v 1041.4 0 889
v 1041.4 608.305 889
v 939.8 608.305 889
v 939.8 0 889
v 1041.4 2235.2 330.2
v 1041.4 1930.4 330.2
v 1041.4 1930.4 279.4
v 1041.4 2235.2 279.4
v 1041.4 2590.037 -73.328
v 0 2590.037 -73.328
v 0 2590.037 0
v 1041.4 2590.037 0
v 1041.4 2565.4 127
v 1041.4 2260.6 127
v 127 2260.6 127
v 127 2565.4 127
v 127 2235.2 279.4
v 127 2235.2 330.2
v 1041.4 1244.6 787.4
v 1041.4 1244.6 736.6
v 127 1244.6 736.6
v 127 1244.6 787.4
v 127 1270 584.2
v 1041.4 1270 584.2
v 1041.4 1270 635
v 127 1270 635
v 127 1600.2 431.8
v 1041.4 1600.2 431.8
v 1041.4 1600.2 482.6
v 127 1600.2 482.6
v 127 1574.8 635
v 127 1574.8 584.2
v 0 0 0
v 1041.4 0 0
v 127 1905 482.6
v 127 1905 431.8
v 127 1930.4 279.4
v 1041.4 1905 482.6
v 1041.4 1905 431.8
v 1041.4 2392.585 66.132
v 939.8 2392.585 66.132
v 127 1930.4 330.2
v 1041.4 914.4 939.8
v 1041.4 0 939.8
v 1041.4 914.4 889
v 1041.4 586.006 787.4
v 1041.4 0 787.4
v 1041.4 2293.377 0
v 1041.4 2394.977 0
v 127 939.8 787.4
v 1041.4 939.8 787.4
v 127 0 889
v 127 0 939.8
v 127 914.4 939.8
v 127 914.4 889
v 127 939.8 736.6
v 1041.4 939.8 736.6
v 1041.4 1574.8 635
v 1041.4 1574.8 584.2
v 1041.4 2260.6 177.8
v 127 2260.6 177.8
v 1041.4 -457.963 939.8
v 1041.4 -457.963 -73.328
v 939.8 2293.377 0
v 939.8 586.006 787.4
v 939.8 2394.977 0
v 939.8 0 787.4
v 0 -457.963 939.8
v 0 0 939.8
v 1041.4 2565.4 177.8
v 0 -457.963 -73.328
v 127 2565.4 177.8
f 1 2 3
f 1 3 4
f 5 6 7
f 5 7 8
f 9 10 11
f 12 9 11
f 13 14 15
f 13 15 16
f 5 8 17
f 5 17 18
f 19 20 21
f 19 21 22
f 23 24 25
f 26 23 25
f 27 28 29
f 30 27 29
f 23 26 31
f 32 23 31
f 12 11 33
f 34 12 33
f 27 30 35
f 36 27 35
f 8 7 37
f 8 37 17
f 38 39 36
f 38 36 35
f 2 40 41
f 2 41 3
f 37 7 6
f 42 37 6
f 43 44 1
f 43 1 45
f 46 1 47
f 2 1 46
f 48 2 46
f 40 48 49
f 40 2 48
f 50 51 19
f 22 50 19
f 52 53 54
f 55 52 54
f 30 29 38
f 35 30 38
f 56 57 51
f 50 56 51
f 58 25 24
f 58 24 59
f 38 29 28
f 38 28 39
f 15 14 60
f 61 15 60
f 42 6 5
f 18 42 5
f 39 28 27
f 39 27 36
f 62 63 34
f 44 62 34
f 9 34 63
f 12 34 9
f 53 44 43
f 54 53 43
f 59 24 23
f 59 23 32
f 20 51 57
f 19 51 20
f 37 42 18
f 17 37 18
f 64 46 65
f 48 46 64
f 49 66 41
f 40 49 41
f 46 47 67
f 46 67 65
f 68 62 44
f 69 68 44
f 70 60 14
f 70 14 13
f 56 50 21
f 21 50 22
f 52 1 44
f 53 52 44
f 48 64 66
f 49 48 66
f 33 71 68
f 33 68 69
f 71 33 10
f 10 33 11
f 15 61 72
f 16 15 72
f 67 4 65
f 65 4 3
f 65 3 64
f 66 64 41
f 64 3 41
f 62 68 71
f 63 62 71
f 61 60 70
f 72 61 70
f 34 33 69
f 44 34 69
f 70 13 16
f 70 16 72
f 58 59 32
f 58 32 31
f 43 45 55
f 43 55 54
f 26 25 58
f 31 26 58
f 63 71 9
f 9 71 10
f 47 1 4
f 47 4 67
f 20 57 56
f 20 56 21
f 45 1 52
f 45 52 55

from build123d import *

# Parameters (mm, degrees)
F0_W     = 457.962586
F0_H     = 939.8
F1_DEPTH = 1041.4
F2_W     = 914.4
F2_H     = 50.8
F2_W_2   = 304.8
F3_DEPTH = 914.4
F5_DEPTH = 101.6


with BuildPart() as f1:
    # F0 (on Right) → F1 (new body)
    with BuildSketch(Plane.YZ):
        with Locations((-228.981293, 469.9)):
            Rectangle(F0_W, F0_H)
        Polygon((2590.037414, 0), (0, 0), (-457.962586, 0), (-457.962586, -73.327616), (2590.037414, -73.327616), align=None)
    extrude(amount=F1_DEPTH)


with BuildPart() as f3:
    # F2 (on face) → F3 (new body)
    with BuildSketch(Plane.YZ.offset(1041.4)):
        with Locations((457.2, 914.4)):
            Rectangle(F2_W, F2_H)
        with Locations((1092.2, 762)):
            Rectangle(F2_W_2, F2_H)
        with Locations((1422.4, 609.6)):
            Rectangle(F2_W_2, F2_H)
        with Locations((1752.6, 457.2)):
            Rectangle(F2_W_2, F2_H)
        with Locations((2082.8, 304.8)):
            Rectangle(F2_W_2, F2_H)
        with Locations((2413, 152.4)):
            Rectangle(F2_W_2, F2_H)
    extrude(amount=-F3_DEPTH)


with BuildPart() as f5:
    # F4 (on face) → F5 (new body)
    with BuildSketch(Plane.YZ.offset(1041.4)):
        Polygon((2392.585126, 66.13153), (608.305036, 889), (586.005814, 787.4), (2293.377277, 0), (2394.977277, 0), align=None)
        Polygon((586.005814, 787.4), (608.305036, 889), (0, 889), (0, 787.4), align=None)
    extrude(amount=-F5_DEPTH)


solid = Compound([f1.part, f3.part, f5.part])
